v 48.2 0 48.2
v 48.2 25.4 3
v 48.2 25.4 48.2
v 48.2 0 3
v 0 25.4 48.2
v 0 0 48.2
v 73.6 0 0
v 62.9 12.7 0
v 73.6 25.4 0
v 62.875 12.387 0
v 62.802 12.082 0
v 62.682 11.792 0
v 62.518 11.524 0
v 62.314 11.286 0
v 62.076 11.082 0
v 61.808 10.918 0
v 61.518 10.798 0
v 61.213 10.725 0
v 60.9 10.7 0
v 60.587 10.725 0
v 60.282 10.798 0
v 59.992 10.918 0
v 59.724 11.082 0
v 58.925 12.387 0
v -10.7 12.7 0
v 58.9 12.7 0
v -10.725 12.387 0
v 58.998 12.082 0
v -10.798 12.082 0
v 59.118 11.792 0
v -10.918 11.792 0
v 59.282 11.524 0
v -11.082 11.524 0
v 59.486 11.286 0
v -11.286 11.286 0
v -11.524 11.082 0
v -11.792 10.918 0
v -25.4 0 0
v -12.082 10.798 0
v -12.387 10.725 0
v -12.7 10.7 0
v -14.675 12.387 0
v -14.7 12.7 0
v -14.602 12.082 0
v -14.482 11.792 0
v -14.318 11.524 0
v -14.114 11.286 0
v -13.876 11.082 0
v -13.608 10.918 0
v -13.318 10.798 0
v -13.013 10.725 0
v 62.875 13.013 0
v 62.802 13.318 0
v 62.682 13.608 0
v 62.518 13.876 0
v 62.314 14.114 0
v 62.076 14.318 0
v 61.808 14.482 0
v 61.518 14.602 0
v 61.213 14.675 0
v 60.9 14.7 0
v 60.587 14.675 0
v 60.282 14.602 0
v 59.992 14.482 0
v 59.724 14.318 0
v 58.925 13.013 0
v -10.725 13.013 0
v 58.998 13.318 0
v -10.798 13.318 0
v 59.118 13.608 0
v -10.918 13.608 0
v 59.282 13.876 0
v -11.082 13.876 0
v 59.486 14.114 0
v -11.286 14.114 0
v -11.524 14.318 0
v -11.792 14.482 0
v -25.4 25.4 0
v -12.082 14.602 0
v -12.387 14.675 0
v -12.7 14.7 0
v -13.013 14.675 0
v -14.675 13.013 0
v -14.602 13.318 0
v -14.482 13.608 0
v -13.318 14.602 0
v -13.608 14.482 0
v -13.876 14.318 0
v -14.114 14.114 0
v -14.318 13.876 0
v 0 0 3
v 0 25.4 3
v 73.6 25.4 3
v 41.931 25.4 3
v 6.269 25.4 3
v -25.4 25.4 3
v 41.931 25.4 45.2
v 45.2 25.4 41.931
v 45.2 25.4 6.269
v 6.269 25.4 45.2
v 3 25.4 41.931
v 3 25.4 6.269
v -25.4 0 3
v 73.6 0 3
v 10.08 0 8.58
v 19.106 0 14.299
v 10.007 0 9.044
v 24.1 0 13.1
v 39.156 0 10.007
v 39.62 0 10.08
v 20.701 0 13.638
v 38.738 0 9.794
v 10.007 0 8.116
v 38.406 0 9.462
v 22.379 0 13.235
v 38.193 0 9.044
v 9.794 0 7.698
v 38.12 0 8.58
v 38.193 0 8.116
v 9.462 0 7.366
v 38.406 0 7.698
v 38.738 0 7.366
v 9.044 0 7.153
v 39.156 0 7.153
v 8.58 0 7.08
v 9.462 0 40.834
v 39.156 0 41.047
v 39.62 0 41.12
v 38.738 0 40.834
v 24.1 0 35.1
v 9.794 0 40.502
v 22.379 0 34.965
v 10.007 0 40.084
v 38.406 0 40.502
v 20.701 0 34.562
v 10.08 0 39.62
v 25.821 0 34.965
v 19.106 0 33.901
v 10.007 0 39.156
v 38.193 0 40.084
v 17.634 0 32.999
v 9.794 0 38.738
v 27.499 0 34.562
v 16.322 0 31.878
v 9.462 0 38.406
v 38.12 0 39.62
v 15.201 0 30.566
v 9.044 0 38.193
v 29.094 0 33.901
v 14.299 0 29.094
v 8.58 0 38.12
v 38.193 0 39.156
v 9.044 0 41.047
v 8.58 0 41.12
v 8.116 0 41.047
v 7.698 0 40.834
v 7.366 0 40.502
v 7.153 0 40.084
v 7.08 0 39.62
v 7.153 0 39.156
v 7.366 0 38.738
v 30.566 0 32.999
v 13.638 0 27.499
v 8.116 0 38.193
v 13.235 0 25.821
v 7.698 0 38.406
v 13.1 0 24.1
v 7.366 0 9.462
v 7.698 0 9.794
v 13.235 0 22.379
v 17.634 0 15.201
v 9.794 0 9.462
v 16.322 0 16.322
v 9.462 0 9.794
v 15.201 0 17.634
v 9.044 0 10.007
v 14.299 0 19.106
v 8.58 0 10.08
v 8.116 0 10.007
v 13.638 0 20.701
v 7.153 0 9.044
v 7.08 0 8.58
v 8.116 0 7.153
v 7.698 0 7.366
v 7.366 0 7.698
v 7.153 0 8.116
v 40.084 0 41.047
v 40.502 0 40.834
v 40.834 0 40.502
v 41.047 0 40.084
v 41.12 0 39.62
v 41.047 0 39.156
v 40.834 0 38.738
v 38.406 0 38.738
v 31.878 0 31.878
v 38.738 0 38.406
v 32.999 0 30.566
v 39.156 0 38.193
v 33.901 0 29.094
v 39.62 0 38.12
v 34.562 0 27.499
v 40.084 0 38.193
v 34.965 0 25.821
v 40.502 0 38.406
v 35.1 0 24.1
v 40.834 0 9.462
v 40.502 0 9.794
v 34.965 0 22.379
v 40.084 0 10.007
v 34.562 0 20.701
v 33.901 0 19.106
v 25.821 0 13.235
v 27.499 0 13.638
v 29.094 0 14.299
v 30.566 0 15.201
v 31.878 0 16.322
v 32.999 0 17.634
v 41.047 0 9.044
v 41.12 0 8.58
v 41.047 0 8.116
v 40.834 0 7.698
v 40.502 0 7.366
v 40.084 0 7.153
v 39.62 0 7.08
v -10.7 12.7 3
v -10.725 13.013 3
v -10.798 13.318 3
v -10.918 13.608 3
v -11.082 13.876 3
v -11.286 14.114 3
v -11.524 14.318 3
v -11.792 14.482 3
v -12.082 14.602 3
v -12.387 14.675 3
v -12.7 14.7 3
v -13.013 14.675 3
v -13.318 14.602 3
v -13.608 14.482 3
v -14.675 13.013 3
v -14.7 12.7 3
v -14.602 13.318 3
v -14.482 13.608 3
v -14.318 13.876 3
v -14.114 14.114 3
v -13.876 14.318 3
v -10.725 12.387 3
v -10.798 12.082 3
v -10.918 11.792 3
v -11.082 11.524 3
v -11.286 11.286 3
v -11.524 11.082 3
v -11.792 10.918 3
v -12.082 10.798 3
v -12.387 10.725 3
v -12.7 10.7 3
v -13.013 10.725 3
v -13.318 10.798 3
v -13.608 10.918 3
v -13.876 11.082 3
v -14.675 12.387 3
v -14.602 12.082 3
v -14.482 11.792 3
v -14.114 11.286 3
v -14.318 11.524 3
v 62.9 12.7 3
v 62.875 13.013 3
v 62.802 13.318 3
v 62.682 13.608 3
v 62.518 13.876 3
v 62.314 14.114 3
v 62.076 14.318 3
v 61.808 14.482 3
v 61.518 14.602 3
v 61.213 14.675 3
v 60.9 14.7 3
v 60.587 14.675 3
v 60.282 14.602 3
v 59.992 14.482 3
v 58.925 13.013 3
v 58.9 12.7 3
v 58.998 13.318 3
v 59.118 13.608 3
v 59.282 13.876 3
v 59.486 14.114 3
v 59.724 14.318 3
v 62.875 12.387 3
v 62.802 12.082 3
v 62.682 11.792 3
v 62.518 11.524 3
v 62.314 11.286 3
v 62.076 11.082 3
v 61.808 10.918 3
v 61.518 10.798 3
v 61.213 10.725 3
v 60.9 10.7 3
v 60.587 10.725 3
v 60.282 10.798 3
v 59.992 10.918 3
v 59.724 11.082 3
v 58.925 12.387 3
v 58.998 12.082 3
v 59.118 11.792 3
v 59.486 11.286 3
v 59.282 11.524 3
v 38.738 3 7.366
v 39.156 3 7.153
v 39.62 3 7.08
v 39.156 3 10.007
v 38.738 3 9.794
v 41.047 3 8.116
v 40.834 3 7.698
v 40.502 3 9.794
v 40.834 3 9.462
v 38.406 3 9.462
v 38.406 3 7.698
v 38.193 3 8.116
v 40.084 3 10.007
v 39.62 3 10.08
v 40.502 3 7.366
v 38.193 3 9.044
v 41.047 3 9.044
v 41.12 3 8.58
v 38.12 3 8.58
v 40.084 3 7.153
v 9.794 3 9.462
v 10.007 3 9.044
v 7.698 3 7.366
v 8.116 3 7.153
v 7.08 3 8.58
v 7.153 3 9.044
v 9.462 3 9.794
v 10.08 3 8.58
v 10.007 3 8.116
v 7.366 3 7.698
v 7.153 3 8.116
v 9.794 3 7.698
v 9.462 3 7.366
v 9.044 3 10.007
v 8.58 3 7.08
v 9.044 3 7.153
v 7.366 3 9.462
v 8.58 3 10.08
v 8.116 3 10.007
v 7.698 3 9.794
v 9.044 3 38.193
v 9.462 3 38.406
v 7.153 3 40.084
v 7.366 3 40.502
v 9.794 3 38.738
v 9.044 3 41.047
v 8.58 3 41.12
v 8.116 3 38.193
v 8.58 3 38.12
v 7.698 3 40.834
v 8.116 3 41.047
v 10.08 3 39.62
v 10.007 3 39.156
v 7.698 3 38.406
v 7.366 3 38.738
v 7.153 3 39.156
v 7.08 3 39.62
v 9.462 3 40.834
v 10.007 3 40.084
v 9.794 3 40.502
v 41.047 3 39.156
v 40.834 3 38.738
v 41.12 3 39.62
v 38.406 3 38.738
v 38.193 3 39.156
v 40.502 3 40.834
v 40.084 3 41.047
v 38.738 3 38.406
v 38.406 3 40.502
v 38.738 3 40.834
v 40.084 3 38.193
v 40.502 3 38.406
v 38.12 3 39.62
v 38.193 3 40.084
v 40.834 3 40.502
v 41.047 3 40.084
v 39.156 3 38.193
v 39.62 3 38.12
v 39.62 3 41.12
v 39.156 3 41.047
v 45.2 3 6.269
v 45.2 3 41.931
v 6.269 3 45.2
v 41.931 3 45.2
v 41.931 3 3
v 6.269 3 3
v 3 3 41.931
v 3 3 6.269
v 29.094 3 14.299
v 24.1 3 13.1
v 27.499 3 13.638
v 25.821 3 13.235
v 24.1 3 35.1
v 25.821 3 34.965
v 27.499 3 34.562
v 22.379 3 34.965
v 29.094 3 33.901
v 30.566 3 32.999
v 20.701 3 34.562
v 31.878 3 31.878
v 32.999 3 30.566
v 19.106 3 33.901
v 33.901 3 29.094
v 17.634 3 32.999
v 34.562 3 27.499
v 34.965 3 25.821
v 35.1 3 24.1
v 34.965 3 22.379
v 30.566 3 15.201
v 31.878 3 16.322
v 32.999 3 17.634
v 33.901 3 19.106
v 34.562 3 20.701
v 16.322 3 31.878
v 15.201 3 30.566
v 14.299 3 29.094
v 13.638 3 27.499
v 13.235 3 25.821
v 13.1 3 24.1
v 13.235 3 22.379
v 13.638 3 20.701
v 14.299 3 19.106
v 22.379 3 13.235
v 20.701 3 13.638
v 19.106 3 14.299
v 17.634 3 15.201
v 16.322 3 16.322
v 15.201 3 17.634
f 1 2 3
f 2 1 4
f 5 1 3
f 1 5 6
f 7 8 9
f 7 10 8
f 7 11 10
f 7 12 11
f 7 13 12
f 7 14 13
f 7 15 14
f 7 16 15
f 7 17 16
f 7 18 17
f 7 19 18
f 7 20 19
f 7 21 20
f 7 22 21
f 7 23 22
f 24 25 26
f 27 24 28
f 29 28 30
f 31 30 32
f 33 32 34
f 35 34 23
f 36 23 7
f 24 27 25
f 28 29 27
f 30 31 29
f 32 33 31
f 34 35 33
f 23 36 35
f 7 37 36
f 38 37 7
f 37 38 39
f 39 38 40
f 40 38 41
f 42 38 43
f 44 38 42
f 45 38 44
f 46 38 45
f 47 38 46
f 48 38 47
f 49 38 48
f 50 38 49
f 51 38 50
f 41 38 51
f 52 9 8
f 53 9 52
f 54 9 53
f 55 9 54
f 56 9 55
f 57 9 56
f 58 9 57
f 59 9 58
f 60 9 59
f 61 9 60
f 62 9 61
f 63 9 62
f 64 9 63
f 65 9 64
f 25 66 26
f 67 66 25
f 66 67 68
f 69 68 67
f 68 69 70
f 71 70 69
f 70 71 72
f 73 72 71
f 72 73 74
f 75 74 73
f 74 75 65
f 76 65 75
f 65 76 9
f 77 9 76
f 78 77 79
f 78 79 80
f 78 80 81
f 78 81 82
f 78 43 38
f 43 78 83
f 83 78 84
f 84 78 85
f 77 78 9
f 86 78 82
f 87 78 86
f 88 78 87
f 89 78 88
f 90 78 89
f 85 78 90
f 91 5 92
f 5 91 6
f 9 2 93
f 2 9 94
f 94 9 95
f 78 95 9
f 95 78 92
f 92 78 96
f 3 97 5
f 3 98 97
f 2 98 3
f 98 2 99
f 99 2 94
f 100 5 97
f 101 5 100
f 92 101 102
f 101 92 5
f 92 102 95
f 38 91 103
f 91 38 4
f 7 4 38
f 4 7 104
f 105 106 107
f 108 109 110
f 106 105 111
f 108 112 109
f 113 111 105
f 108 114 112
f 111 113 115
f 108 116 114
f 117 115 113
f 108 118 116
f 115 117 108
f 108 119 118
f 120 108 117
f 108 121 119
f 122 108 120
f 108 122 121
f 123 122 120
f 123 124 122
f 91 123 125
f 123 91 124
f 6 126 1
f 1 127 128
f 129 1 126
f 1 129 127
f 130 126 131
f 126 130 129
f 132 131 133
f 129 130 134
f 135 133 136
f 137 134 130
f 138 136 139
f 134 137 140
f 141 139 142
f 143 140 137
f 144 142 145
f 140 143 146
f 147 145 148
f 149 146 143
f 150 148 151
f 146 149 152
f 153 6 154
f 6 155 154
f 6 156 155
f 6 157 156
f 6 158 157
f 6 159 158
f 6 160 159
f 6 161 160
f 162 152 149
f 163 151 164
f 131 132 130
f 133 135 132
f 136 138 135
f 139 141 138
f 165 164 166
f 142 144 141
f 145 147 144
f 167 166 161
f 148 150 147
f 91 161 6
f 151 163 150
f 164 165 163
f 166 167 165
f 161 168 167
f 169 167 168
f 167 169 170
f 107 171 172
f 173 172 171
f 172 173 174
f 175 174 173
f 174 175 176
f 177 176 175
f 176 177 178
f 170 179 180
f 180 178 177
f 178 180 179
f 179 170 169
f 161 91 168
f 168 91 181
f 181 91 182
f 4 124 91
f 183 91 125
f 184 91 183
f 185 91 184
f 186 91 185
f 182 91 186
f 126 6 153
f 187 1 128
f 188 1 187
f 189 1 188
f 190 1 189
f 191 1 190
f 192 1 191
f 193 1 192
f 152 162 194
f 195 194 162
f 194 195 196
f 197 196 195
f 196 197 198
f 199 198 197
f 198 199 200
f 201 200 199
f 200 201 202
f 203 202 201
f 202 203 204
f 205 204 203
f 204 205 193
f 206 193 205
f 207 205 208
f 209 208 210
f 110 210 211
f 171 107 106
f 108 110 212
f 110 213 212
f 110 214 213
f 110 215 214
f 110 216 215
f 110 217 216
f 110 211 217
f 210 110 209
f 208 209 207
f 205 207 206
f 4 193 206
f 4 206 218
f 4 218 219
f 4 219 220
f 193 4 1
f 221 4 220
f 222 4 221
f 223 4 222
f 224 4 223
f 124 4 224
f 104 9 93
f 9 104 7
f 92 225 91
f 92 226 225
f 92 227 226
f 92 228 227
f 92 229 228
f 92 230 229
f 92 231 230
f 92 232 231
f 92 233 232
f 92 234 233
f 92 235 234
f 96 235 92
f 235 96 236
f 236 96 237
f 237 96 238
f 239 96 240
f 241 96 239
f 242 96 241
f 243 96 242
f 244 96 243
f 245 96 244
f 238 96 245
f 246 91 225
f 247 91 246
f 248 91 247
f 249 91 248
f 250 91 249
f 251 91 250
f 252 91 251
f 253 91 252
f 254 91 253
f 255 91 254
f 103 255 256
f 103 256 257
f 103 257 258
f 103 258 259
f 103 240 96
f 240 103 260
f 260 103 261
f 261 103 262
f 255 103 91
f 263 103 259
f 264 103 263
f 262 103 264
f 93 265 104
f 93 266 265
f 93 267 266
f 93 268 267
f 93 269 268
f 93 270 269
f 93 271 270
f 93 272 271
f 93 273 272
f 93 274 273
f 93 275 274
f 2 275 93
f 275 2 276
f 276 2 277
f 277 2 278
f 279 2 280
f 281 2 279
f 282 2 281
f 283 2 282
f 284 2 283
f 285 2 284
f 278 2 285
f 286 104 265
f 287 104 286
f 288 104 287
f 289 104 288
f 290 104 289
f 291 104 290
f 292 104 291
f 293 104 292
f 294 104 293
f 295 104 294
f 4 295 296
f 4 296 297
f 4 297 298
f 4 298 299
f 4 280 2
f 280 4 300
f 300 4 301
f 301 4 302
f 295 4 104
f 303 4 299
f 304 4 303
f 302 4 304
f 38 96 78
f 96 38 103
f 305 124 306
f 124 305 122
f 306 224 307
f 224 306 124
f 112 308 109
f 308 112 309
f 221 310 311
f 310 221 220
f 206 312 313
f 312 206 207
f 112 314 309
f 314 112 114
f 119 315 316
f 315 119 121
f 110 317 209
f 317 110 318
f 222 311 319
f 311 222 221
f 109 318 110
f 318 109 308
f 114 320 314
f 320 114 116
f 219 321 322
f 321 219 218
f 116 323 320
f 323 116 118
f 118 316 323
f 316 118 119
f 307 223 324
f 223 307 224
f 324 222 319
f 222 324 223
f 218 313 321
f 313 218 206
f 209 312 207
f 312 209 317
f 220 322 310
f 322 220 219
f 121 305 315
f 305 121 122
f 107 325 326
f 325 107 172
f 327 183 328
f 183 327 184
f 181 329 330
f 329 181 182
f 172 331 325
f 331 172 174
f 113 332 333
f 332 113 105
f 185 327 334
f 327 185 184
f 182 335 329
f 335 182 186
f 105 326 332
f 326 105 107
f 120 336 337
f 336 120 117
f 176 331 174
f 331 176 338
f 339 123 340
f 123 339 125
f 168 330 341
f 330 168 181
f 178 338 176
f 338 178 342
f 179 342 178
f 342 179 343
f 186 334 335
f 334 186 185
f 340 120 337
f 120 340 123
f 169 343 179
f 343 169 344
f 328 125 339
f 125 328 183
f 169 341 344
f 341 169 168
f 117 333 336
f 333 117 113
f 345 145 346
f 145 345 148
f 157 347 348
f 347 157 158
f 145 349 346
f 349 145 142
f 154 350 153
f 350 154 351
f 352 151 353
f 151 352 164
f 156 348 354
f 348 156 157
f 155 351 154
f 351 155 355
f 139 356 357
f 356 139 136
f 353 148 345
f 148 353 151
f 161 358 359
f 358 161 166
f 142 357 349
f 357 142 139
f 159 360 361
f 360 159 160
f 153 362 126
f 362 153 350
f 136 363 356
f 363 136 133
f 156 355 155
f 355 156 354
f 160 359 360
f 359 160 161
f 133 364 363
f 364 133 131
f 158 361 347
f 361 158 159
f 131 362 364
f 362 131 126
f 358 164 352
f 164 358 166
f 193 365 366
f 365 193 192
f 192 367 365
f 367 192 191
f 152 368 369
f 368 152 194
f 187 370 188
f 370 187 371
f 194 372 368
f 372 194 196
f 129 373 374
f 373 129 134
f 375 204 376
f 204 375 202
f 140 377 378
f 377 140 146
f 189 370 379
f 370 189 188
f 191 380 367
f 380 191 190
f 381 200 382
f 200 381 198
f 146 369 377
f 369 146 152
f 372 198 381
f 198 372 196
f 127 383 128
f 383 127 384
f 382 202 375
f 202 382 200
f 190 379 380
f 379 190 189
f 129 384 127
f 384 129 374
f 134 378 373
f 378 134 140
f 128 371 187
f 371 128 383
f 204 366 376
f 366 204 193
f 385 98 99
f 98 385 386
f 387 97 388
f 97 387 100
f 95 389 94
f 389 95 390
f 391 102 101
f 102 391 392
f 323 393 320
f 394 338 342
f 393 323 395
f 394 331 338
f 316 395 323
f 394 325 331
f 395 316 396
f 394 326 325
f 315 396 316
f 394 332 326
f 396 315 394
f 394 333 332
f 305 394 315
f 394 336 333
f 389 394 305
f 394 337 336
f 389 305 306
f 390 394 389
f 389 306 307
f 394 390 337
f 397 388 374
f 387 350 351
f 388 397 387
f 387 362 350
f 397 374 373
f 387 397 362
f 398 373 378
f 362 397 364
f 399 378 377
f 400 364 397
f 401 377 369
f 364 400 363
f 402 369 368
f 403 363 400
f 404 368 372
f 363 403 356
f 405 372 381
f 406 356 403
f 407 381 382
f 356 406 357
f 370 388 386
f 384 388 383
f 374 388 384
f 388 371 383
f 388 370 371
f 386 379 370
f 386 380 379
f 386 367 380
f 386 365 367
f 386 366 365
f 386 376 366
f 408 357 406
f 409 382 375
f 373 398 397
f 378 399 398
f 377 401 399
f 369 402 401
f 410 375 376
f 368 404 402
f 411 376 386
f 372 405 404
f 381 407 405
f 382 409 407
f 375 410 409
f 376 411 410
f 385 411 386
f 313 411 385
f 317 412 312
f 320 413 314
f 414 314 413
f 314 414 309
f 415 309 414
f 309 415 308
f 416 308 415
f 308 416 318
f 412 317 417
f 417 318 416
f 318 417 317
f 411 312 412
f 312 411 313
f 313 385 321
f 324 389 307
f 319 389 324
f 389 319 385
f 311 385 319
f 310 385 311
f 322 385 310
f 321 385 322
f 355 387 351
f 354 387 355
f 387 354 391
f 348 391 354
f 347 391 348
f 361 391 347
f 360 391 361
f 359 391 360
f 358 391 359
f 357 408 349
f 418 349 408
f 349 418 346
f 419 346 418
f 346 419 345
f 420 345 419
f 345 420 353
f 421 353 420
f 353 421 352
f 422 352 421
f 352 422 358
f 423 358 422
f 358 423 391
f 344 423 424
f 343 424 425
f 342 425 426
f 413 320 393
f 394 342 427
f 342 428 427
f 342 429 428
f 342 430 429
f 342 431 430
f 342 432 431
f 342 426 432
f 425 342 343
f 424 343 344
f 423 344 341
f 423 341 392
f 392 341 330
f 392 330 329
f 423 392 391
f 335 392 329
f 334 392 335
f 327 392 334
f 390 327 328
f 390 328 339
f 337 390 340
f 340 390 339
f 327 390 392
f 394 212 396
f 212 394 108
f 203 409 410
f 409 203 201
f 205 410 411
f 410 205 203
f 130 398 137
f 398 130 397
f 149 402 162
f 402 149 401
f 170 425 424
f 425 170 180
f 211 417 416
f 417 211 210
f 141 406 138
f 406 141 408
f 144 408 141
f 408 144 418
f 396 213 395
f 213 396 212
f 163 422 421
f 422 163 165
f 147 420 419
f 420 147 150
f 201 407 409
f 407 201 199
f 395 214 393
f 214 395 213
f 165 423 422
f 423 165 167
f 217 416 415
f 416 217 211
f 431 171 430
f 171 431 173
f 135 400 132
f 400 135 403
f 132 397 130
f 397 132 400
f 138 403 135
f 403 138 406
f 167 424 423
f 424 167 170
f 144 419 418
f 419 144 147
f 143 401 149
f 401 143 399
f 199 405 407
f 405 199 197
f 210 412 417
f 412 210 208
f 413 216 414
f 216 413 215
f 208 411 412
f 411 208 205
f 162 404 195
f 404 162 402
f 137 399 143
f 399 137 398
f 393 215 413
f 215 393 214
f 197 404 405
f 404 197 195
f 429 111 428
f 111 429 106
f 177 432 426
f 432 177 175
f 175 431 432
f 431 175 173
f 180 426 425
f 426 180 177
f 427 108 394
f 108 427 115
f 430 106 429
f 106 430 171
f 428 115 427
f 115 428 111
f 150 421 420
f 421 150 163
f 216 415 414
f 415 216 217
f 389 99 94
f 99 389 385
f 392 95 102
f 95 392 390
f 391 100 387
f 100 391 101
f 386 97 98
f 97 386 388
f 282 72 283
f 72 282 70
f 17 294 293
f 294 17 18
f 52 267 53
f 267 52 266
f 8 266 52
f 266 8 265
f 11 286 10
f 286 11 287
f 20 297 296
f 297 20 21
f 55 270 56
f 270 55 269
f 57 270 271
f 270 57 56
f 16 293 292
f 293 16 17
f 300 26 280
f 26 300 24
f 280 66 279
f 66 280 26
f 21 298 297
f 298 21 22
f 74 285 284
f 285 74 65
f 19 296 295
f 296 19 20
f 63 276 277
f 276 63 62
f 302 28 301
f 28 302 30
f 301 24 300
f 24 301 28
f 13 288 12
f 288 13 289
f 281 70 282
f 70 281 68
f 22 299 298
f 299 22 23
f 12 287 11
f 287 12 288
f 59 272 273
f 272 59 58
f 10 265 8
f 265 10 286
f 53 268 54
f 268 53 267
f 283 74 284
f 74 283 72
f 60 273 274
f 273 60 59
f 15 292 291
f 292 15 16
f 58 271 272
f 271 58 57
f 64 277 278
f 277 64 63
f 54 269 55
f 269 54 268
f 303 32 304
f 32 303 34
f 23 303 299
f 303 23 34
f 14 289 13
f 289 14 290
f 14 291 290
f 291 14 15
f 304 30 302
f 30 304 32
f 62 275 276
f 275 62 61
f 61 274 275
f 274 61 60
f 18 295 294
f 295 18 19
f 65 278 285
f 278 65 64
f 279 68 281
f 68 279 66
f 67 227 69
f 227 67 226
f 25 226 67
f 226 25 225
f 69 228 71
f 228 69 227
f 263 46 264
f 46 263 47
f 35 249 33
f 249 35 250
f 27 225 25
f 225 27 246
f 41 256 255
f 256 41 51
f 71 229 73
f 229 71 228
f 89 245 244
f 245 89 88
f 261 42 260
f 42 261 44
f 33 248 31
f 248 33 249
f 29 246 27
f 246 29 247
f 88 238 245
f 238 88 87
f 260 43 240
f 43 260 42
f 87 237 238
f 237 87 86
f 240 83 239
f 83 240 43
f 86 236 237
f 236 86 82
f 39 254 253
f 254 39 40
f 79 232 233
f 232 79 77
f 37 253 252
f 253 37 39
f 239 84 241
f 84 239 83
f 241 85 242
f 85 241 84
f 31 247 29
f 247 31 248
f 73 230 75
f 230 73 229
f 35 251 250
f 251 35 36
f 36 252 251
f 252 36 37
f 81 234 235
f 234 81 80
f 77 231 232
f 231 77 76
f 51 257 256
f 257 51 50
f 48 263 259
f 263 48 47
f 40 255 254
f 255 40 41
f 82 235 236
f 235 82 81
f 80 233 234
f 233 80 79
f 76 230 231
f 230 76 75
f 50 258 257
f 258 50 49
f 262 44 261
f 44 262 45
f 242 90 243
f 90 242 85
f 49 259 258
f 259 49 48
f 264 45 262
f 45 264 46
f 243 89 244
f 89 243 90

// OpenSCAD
// preview[view:north west, tilt:top diagonal]

bracket_wall_width = 3;
bracket_depth = 25.4; // 1 inch
//lengths of tabs
bracket_flaps =  25.4;
bracket_bolts_diameter = 4; 
bevel_inner_corners = "yes"; //[yes,no]


module NemaForCSG(nema_side, nema_depth, nema_bolts, nema_crown, nema_bolt_radious)
{
	//bevel corners
	r1 = nema_side/2- nema_bolts/2;
	r2 = sqrt(2)* r1 ;
	r=(r2-r1)*2;
	
	
	difference()
	{
	
		union()
		{
			cube([nema_side,nema_depth,nema_side]);
	
			translate( [nema_side/2,0,nema_side/2]) 
				rotate(90,[1,0,0]) 
				{
					cylinder(r = nema_crown, h = 30, $fn = 40,center=true);
				}

			translate( [nema_side/2,0,nema_side/2])
			{
				//bolt holes
				for(j=[1:4])
				{		
					rotate(90*j,[0,1,0]) 
						translate( [nema_bolts/2.0,0,nema_bolts/2.0]) 
							rotate(-90,[1,0,0]) 
							{
								cylinder(r = nema_bolt_radious, h = 30, $fn = 20,center=true);
							}
				}
			}
		}	

		if (bevel_inner_corners == "yes")
		{
			//bevel
			translate( [nema_side/2,0,nema_side/2])
			{
			
				for(j=[1:4])
				{
					rotate(90*j,[0,1,0]) 
						translate( [nema_side/2,nema_depth/2,nema_side/2]) 
					rotate(45,[0,1,0]) 
					cube([30,50,r], center = true);
				}
			}
		}
	}

}

//units are in millimeters
M3 = 3.0/2.0;
nema17_side = 42.2;
nema17_bolts = 31.04;
nema17_depth = 33.8;
nema17_crown = 11;
nema17_bolt_radious = M3;

difference()
{
	union()
	{
		cube([nema17_side+bracket_wall_width*2, bracket_depth, nema17_side+bracket_wall_width*2]);

		translate([-bracket_flaps,0,0])
			cube([nema17_side+(bracket_wall_width+bracket_flaps)*2,bracket_depth,bracket_wall_width]);		
	}

	translate([bracket_wall_width + nema17_side + bracket_wall_width + bracket_flaps/2,bracket_depth/2,0])
		cylinder(r = bracket_bolts_diameter/2, h = 30, $fn = 40,center=true);

	translate([-bracket_flaps/2,bracket_depth/2,0])
		cylinder(r = bracket_bolts_diameter/2, h = 30, $fn = 40,center=true);


	translate([bracket_wall_width,bracket_wall_width,bracket_wall_width])
	NemaForCSG(nema17_side, nema17_depth, nema17_bolts, nema17_crown, nema17_bolt_radious);

}
